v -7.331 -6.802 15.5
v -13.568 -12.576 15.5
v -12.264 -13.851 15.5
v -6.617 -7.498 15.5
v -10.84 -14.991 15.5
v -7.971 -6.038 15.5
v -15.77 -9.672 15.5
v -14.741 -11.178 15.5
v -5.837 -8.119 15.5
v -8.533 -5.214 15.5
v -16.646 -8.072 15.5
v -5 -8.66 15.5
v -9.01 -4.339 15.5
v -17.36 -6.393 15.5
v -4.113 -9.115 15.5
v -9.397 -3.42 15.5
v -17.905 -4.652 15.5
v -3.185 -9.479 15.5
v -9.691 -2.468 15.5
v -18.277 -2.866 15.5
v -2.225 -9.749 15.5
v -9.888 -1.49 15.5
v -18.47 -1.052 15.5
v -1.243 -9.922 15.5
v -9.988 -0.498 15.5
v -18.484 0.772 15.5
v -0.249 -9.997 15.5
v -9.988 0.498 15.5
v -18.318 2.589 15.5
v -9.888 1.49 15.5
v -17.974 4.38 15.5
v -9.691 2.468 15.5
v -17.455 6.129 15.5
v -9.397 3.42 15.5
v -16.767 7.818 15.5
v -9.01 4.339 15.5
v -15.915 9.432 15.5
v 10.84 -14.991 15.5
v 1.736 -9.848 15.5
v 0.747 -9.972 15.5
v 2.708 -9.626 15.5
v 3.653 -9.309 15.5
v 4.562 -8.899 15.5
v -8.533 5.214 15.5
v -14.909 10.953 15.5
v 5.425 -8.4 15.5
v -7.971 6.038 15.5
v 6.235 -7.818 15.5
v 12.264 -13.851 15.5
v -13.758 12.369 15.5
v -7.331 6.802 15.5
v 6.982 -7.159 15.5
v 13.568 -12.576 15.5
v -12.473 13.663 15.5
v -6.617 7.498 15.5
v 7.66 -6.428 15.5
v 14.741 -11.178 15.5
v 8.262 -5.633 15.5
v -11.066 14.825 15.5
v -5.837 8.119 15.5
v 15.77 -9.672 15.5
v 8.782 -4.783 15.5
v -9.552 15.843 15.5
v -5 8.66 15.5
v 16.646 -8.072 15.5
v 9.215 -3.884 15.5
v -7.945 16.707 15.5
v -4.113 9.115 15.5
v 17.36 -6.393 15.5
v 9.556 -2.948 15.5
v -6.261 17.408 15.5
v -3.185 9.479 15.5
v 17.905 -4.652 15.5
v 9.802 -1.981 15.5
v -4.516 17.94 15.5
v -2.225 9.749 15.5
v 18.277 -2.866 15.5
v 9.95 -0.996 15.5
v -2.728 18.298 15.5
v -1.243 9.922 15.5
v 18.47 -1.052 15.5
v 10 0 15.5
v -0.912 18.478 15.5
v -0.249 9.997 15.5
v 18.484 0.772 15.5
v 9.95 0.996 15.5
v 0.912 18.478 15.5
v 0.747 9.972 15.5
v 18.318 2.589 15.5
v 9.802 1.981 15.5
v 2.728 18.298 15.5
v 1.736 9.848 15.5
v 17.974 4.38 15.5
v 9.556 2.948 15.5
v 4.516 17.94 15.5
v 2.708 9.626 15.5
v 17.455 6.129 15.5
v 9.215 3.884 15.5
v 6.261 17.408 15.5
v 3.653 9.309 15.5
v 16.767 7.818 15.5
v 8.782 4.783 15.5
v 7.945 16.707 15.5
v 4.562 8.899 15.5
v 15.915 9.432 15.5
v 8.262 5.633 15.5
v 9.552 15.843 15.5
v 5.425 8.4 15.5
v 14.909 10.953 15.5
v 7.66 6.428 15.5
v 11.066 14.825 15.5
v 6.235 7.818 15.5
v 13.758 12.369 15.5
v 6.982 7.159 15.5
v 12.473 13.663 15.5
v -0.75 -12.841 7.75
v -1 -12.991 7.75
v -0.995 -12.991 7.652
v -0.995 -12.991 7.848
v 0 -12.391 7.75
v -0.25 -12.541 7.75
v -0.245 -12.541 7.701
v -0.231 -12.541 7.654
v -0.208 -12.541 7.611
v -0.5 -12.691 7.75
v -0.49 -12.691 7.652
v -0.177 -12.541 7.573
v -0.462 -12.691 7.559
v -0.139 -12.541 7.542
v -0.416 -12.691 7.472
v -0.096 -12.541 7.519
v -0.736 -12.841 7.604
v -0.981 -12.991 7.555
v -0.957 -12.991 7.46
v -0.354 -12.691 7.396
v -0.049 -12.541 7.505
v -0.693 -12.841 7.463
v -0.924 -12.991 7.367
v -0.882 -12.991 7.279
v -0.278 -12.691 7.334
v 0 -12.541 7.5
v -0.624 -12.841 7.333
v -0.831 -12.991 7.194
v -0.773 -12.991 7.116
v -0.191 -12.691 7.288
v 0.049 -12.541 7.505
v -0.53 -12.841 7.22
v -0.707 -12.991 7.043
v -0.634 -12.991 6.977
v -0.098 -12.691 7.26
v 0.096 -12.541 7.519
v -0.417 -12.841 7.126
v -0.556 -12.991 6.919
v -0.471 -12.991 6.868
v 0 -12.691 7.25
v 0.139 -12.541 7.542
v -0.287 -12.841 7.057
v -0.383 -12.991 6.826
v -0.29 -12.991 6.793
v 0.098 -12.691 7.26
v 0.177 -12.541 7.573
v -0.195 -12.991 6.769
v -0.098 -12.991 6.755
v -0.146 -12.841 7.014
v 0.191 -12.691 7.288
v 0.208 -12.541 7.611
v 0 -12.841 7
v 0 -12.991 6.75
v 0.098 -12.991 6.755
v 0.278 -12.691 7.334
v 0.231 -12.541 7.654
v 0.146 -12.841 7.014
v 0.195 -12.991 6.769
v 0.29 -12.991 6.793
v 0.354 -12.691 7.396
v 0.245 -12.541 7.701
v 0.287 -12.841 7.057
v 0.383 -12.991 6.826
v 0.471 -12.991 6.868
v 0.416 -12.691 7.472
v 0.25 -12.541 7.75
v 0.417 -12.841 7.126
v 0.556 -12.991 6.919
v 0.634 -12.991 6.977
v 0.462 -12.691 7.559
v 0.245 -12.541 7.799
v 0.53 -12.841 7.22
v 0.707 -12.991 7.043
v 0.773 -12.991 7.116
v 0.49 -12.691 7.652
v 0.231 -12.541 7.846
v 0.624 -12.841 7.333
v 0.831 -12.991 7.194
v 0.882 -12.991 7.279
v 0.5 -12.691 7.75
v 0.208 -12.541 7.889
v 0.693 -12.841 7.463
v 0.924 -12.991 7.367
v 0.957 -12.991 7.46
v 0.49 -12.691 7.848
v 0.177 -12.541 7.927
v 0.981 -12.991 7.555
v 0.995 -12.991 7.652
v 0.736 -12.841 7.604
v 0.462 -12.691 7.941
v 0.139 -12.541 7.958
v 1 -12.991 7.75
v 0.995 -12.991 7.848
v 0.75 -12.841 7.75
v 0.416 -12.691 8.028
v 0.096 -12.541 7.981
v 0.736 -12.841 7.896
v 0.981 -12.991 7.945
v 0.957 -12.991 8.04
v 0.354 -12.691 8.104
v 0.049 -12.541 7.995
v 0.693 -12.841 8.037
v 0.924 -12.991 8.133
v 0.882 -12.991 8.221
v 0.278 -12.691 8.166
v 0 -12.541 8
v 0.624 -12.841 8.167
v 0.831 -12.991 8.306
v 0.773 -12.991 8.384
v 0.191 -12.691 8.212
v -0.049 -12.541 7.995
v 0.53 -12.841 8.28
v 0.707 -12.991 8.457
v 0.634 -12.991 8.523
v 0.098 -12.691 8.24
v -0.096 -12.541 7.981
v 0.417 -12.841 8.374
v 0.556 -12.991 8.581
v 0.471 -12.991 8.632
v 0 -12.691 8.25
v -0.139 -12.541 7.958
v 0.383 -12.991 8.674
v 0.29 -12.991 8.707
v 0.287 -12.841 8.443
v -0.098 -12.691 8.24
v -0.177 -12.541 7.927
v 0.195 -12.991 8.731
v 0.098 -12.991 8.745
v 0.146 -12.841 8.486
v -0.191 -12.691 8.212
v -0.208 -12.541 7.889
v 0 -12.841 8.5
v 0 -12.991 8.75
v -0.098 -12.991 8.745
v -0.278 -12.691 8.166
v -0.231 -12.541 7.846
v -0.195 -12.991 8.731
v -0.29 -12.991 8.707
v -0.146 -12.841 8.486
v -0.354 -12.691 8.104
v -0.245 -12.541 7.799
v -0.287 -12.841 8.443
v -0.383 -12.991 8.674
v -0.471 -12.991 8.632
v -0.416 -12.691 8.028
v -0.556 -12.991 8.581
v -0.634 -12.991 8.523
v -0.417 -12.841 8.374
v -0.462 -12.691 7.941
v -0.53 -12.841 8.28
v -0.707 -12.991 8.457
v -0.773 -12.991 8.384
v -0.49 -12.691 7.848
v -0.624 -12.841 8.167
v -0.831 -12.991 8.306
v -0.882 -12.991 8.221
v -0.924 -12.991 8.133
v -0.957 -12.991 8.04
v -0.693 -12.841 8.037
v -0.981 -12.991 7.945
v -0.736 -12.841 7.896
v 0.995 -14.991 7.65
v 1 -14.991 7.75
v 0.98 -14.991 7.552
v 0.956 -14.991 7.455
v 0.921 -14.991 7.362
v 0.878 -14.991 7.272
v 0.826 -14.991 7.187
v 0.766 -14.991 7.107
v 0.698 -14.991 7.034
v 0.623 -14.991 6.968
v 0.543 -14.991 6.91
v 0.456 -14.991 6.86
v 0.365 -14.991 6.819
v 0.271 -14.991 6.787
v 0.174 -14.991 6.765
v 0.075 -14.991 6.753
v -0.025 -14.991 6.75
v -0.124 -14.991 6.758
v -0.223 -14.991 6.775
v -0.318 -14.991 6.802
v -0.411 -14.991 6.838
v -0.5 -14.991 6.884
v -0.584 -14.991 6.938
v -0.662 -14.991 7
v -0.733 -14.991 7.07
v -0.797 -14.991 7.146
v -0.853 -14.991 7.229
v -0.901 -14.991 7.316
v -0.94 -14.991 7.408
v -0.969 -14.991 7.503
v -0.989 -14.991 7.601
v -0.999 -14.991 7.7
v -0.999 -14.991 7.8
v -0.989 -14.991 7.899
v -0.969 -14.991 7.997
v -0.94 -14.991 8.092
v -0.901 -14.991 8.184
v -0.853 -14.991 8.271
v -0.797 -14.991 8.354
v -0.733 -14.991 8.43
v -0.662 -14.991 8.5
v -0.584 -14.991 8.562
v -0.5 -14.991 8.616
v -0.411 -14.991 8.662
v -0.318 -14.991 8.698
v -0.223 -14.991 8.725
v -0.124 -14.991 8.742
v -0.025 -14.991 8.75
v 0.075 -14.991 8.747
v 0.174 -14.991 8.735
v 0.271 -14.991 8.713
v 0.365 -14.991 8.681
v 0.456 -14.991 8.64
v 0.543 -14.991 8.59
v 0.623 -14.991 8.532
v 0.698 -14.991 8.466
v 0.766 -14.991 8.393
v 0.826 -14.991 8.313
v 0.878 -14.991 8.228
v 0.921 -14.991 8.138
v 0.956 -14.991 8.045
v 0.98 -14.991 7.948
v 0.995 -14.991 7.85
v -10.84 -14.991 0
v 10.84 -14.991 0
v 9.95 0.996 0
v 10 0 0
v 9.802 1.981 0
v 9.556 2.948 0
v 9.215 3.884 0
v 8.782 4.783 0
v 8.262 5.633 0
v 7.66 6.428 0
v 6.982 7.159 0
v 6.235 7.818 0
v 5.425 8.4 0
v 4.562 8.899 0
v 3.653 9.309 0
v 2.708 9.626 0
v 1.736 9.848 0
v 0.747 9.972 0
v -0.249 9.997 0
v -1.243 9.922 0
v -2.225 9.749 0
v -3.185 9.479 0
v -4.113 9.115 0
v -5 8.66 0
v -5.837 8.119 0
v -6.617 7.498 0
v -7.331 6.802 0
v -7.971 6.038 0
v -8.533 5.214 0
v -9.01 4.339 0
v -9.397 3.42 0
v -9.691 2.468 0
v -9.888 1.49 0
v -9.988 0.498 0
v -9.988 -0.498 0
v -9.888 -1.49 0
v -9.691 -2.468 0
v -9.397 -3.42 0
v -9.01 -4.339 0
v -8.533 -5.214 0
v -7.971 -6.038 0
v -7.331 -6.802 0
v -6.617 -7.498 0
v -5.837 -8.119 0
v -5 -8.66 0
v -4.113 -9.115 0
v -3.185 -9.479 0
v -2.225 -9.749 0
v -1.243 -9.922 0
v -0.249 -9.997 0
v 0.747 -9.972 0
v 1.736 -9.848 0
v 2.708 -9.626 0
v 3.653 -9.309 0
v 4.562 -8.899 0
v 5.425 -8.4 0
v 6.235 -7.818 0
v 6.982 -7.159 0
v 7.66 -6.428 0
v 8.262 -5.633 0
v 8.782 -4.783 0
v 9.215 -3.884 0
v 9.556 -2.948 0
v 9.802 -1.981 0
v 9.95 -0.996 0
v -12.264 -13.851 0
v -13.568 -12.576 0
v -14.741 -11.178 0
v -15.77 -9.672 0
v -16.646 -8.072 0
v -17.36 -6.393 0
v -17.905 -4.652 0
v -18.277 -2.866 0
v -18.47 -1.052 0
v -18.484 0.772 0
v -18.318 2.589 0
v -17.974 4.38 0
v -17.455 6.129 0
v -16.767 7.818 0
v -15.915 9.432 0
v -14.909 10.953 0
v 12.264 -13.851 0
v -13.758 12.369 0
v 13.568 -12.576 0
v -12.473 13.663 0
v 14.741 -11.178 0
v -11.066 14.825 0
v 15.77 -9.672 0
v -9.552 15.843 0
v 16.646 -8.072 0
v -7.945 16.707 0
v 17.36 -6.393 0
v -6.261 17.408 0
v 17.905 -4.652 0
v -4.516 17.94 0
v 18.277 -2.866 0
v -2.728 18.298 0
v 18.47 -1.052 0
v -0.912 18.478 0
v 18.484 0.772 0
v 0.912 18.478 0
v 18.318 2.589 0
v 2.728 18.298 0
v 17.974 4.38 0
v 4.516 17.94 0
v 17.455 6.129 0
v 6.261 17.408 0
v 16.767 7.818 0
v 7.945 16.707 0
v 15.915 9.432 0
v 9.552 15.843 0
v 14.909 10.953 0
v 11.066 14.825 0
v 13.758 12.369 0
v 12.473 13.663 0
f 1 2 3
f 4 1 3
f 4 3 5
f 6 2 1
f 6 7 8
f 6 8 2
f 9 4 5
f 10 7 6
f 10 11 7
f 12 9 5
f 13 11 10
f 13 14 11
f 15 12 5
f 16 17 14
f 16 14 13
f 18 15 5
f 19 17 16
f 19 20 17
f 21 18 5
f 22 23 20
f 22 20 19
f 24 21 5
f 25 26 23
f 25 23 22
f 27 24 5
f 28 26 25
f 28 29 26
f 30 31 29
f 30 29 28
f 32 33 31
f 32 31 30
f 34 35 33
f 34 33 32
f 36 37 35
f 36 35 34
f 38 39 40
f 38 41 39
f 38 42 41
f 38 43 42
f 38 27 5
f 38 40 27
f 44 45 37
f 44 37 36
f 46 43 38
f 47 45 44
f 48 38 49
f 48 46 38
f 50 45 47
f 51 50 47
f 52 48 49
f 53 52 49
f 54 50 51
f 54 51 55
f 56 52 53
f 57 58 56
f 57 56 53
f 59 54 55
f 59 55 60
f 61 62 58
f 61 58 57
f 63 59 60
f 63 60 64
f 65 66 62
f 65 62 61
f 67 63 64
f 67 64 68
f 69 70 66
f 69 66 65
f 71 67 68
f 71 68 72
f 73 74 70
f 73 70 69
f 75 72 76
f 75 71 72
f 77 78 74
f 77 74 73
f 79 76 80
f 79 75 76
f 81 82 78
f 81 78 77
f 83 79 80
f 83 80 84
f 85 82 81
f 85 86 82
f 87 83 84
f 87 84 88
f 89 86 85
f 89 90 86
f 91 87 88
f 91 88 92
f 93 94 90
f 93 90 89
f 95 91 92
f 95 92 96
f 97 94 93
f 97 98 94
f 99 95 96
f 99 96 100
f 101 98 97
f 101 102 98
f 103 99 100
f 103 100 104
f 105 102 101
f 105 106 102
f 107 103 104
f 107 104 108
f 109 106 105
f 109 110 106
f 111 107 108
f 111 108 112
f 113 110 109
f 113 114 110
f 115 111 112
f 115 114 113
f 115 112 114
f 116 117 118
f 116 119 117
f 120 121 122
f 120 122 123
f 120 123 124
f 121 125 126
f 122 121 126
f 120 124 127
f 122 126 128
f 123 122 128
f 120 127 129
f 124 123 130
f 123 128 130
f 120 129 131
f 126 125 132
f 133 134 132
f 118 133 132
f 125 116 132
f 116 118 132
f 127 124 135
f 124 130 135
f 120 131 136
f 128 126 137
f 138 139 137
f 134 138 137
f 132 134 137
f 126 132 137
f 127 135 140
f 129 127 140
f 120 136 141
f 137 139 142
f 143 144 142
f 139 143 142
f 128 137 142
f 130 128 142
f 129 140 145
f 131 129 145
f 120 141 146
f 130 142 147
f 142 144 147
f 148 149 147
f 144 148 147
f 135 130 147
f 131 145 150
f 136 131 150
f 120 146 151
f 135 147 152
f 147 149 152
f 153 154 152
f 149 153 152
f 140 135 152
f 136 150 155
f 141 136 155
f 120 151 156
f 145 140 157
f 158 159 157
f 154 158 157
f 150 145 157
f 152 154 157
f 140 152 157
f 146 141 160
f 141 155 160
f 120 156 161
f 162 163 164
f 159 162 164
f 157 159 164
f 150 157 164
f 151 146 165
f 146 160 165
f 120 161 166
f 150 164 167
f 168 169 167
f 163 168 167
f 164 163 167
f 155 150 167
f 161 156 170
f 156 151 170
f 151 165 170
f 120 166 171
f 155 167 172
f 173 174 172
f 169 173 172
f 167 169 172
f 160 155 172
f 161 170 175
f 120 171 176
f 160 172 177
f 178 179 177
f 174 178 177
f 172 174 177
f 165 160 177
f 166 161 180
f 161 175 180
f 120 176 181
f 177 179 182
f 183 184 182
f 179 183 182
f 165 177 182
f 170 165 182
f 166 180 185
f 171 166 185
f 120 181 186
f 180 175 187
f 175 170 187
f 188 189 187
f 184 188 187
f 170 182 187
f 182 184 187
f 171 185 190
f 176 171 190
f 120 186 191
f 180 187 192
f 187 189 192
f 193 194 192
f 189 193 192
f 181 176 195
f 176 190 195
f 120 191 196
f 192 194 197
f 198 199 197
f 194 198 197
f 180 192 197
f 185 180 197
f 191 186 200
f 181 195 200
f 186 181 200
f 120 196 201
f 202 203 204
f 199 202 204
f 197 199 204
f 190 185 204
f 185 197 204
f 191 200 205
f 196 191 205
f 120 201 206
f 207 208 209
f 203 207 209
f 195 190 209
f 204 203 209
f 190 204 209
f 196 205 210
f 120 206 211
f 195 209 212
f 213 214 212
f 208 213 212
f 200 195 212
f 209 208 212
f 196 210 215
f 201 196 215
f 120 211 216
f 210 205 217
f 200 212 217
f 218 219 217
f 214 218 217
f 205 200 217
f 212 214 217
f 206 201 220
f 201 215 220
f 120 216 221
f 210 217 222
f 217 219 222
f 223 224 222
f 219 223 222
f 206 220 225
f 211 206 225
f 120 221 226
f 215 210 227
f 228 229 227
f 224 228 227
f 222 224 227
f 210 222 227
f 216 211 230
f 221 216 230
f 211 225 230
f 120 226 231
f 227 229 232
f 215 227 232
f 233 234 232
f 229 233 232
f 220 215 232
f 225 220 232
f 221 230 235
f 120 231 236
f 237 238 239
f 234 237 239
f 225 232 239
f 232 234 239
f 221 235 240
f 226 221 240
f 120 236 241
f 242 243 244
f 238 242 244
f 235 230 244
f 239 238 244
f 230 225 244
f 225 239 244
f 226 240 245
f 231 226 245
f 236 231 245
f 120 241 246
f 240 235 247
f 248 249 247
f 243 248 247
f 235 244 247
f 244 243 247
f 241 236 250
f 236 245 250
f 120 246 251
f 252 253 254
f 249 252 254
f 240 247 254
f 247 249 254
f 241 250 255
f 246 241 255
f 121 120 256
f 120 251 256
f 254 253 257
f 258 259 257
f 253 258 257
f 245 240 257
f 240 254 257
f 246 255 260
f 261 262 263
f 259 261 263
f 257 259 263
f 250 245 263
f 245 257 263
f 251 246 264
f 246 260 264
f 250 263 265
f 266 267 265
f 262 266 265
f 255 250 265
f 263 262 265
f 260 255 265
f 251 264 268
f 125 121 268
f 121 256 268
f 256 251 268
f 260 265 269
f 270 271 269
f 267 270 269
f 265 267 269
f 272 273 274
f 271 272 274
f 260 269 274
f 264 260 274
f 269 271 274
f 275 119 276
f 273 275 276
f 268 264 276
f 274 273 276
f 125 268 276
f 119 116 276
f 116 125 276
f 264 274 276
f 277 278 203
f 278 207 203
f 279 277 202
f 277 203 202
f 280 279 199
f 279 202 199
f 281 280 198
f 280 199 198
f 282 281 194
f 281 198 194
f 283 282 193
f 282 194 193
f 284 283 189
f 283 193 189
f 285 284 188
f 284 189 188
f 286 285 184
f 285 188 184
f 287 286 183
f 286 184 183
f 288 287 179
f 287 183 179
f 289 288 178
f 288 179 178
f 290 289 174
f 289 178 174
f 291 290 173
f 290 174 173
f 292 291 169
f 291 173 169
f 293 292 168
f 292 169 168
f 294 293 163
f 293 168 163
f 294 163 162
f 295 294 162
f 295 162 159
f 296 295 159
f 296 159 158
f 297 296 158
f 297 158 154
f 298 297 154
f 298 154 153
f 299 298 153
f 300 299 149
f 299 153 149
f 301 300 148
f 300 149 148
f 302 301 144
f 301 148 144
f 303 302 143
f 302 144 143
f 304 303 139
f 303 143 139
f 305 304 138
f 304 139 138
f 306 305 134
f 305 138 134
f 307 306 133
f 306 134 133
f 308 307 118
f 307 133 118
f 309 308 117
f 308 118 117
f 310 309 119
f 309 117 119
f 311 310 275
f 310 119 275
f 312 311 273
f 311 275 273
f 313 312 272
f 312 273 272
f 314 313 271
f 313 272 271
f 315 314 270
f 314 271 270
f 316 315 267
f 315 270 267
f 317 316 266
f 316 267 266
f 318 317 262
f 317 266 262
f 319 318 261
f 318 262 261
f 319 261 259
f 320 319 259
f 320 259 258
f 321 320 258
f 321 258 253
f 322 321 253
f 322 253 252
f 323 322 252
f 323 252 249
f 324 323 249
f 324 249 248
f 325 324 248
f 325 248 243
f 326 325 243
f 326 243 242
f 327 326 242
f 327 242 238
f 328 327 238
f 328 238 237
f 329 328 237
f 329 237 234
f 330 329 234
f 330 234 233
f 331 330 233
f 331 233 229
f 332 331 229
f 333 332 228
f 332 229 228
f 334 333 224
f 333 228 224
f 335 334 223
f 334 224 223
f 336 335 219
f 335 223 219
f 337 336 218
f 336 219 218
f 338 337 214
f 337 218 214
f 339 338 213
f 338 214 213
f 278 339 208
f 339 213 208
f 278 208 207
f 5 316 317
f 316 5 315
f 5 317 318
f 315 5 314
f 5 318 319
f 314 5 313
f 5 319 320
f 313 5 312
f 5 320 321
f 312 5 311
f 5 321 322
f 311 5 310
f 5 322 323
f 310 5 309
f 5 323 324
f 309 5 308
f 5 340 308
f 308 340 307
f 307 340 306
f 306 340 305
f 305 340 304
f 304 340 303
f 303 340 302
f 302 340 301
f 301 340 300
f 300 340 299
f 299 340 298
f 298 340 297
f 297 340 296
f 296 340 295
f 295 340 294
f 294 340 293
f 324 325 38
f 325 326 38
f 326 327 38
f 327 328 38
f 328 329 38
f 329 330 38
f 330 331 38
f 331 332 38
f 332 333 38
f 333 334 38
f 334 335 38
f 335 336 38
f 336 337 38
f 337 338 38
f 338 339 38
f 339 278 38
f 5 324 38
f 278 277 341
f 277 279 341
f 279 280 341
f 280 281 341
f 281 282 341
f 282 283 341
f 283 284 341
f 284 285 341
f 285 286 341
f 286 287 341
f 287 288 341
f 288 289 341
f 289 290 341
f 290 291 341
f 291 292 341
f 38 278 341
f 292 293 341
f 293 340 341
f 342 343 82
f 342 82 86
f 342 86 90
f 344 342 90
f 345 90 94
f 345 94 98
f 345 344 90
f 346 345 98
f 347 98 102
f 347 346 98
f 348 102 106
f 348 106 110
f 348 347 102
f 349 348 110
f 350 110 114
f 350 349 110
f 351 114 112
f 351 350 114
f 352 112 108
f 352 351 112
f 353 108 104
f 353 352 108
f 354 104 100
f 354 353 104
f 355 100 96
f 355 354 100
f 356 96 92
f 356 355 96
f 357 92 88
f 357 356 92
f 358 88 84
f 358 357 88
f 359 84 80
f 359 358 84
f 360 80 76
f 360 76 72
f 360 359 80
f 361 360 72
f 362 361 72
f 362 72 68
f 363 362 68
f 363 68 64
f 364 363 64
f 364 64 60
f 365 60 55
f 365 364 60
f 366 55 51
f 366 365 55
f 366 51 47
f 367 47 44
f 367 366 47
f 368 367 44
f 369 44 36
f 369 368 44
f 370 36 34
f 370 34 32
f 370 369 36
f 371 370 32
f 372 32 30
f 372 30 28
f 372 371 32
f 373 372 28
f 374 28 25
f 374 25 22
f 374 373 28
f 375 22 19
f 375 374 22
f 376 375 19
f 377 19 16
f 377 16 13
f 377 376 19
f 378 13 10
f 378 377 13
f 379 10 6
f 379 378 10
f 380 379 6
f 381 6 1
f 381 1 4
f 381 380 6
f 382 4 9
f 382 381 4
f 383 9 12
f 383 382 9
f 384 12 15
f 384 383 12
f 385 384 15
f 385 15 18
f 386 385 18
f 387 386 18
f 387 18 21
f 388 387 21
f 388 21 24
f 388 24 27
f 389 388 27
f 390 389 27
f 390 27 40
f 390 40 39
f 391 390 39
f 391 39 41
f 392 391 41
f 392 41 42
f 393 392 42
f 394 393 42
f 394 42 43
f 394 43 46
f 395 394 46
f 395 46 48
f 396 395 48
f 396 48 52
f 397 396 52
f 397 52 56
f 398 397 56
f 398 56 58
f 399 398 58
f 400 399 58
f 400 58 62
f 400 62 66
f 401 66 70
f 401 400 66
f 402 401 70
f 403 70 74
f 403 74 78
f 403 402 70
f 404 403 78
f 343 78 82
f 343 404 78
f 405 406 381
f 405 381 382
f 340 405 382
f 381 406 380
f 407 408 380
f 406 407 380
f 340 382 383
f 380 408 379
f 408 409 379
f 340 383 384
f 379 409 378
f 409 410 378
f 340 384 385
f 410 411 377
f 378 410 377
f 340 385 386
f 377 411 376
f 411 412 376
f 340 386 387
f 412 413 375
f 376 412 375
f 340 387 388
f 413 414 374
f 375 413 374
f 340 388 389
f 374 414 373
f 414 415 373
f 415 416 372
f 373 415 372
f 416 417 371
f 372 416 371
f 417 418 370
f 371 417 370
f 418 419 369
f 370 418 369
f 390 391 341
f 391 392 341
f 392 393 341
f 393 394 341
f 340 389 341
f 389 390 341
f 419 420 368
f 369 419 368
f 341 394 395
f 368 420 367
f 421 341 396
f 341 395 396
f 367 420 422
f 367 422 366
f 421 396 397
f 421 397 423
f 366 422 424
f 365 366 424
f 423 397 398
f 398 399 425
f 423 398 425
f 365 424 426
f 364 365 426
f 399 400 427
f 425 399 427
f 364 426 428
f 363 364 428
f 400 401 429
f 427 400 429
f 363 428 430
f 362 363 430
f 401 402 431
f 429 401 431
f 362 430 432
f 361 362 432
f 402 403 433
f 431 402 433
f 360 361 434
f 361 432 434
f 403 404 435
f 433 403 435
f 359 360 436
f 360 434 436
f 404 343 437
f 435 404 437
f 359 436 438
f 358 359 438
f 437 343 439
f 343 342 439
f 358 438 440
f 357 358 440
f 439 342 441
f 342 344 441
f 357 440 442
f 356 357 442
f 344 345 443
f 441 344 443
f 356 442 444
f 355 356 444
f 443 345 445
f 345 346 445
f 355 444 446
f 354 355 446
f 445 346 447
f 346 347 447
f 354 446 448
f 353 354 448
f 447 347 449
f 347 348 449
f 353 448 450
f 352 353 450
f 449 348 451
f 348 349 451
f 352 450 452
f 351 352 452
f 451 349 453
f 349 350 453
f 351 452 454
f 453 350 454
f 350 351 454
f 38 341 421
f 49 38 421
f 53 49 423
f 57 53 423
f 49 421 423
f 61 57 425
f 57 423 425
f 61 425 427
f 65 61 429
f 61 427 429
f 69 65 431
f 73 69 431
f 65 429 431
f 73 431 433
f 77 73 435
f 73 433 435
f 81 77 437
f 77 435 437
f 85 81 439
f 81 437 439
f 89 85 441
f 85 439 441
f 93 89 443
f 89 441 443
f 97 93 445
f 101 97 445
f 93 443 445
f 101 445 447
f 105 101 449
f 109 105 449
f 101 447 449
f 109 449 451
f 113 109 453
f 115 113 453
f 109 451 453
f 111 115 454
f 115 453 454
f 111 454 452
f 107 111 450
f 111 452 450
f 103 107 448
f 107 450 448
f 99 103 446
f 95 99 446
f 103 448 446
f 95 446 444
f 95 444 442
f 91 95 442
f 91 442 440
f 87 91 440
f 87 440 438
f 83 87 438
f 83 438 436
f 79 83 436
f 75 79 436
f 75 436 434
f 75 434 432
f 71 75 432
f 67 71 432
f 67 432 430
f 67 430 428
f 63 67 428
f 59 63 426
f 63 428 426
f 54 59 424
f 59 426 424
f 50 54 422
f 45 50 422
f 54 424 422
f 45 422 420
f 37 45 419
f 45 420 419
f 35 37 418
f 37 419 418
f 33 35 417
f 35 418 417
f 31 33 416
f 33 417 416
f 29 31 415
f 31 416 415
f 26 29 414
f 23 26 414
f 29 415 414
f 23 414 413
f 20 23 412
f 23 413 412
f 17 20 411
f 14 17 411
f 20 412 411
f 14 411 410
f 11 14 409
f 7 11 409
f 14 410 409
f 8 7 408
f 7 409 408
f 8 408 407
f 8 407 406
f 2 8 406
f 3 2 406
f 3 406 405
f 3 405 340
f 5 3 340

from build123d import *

# Parameters (mm, degrees)
SKETCH1_R                    = 10
BOSS_EXTRUDE1_DEPTH          = 15.5
F_2_0_2_DIAMETER_HOLE1_D     = 2
F_2_0_2_DIAMETER_HOLE1_DEPTH = 2
F_2_0_2_DIAMETER_HOLE1_TIP   = 0.600860619


with BuildPart() as part:
    # Sketch1 → Boss-Extrude1 (new body)
    with BuildSketch(Plane.XY):
        with BuildLine():
            Line((-10.84, -14.991477579), (10.84, -14.991477579))
            ThreePointArc((10.84, -14.991477579), (0, 18.5), (-10.84, -14.991477579))
        make_face()
        Circle(SKETCH1_R, mode=Mode.SUBTRACT)
    extrude(amount=BOSS_EXTRUDE1_DEPTH)

    # Ø2.0 (2) Diameter Hole1
    with Locations(Plane(origin=(0, -14.991477579, 0), x_dir=(-1, 0, 0), z_dir=(0, -1, 0))):
        with Locations((0, -7.75)):
            Hole(F_2_0_2_DIAMETER_HOLE1_D / 2, depth=F_2_0_2_DIAMETER_HOLE1_DEPTH)
            with Locations((0, 0, -(F_2_0_2_DIAMETER_HOLE1_DEPTH + F_2_0_2_DIAMETER_HOLE1_TIP / 2))):  # 118° drill point
                Cone(0, F_2_0_2_DIAMETER_HOLE1_D / 2, F_2_0_2_DIAMETER_HOLE1_TIP, mode=Mode.SUBTRACT)


solid = part.part
